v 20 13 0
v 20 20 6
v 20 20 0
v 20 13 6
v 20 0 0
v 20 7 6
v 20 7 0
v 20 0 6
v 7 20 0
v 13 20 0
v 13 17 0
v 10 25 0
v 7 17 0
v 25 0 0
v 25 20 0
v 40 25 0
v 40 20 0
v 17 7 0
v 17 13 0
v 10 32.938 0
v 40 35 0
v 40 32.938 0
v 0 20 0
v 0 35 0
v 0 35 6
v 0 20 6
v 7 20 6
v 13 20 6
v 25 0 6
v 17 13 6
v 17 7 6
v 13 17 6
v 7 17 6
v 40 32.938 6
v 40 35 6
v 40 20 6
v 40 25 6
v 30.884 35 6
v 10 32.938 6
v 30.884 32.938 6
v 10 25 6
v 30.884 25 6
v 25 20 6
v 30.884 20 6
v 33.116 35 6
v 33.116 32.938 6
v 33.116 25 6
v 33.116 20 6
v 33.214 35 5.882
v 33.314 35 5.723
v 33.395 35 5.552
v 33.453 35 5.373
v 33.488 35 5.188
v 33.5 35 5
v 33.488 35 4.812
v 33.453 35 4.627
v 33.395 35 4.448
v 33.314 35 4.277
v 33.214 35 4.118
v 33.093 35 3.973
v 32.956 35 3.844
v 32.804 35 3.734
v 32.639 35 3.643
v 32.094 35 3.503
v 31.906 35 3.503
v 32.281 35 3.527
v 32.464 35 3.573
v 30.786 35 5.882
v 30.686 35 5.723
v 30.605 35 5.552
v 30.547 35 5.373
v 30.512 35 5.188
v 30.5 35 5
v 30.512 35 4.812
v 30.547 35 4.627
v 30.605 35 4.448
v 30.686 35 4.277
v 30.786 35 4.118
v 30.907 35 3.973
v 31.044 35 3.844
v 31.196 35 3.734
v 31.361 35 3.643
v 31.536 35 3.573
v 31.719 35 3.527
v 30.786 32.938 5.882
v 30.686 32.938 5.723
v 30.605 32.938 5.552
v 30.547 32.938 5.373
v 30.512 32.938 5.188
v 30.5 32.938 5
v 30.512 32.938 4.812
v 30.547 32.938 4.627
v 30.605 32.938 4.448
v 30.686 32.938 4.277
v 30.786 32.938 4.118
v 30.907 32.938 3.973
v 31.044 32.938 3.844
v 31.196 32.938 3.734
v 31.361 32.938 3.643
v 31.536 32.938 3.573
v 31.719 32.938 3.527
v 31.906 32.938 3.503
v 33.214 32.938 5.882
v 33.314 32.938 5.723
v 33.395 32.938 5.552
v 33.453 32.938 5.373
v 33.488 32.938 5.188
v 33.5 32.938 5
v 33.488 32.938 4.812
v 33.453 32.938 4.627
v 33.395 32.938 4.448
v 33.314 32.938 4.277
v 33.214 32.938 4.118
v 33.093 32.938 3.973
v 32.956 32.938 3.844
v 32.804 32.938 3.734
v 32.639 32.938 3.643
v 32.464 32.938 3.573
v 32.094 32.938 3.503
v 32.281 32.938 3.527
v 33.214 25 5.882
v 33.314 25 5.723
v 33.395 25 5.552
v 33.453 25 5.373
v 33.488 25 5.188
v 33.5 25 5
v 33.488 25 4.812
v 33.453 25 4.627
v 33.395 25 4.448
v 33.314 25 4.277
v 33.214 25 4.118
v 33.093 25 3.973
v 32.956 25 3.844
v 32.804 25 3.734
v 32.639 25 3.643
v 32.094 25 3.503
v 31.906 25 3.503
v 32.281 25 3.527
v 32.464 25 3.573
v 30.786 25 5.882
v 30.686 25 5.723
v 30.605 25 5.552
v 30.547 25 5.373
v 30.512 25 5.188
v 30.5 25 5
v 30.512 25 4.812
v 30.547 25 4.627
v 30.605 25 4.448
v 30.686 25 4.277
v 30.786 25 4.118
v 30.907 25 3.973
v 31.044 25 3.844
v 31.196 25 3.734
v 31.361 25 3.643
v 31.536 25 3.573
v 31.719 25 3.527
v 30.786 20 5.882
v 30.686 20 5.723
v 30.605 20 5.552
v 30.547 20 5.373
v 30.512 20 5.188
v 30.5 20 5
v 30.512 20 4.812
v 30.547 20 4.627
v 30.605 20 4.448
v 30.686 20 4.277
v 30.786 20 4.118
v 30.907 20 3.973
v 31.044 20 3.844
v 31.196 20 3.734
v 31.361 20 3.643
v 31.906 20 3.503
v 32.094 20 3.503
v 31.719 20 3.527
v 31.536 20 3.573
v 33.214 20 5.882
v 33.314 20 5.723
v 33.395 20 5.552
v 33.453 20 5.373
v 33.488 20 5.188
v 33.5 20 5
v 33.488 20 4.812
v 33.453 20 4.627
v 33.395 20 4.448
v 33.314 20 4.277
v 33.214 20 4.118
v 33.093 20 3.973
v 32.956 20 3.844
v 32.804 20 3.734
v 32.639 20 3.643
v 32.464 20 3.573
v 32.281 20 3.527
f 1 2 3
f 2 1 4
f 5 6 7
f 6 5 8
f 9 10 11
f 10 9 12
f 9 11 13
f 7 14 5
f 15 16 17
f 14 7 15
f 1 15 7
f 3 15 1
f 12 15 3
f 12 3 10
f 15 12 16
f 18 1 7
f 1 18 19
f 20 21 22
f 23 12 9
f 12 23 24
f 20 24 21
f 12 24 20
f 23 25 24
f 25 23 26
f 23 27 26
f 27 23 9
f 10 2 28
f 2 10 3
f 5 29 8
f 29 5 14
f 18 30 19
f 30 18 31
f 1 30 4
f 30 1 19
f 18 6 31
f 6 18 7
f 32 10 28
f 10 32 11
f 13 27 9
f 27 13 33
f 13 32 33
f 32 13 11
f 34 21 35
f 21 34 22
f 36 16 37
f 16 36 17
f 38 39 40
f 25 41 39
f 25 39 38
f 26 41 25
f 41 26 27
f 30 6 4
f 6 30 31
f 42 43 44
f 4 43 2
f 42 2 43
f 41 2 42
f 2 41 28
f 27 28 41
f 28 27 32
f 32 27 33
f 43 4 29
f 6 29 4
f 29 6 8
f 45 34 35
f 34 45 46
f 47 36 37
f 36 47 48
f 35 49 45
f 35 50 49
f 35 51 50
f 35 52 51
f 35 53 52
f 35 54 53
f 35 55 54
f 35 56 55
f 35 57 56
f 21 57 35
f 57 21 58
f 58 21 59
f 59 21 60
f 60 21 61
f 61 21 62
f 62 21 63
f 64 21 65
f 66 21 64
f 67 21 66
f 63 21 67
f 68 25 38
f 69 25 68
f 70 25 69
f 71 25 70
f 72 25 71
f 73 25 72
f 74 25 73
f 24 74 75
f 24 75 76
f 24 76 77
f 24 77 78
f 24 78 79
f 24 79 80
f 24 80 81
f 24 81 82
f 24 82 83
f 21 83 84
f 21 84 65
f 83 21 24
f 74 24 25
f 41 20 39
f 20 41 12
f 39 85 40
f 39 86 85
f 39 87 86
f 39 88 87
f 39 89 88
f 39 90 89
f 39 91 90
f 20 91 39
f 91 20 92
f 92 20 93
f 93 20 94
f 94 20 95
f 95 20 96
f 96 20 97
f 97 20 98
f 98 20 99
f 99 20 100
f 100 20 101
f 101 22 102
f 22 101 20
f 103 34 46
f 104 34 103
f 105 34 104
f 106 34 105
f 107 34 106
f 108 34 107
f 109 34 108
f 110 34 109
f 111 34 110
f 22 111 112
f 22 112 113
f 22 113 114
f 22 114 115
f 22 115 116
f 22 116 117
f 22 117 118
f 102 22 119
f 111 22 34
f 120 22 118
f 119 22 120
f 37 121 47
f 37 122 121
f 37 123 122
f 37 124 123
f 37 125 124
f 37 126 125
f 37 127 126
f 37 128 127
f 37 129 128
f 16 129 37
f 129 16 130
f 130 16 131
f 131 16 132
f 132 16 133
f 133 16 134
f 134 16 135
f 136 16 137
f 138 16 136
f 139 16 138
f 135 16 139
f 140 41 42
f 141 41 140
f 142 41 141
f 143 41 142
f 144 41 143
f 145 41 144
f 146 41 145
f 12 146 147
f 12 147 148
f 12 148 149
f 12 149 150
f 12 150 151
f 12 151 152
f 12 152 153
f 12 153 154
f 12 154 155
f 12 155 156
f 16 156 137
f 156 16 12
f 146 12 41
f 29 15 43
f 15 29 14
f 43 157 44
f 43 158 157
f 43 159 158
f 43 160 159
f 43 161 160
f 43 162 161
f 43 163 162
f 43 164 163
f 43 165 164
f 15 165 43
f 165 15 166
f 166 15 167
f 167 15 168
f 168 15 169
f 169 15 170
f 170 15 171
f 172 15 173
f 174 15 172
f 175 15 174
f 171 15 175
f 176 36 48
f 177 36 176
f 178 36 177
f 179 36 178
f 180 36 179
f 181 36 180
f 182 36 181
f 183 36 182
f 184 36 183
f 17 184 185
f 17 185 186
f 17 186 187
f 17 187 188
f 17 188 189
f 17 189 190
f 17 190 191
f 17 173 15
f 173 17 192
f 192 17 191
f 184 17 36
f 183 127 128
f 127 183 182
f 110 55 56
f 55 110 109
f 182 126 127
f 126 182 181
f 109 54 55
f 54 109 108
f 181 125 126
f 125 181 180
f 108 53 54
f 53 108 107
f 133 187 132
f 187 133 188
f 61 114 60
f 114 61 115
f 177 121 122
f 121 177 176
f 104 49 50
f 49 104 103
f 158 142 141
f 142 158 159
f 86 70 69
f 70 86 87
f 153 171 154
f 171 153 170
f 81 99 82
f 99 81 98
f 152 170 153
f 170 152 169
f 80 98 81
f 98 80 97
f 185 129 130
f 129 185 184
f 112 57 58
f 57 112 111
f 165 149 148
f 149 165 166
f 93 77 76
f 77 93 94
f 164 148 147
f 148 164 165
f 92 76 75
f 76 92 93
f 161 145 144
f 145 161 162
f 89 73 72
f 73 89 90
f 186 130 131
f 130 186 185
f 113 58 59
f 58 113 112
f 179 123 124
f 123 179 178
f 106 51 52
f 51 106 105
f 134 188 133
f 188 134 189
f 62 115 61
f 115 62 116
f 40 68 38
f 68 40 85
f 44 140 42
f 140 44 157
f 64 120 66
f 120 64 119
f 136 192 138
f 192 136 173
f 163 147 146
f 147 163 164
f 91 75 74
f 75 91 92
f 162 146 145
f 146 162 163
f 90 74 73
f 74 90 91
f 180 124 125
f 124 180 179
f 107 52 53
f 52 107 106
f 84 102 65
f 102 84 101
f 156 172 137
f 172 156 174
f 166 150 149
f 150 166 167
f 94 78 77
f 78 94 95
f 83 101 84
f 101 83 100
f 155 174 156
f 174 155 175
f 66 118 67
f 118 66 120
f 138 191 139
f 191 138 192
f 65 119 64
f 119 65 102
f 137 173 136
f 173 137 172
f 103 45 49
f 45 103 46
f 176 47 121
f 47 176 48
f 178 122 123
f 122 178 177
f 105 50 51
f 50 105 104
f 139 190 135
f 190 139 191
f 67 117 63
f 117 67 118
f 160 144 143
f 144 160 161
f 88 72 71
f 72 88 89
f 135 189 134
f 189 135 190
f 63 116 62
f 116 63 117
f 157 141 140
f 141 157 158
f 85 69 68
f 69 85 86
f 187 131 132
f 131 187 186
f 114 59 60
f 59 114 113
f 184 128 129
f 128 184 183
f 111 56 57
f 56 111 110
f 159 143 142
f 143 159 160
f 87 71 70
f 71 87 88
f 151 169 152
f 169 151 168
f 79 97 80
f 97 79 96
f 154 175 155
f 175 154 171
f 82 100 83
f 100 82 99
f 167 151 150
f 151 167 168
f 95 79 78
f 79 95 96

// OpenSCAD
// file: inc/functions.scad
// PRUSA iteration3
// Functions used in many files
// GNU GPL v3
// Josef Průša <josefprusa@me.com>
// Václav 'ax' Hůla <axtheb@gmail.com>
// Vlnofka <>
// http://www.reprap.org/wiki/Prusa_Mendel
// http://github.com/josefprusa/Prusa3


module nut(d,h,horizontal=true){
    cornerdiameter =  (d / 2) / cos (180 / 6);
    cylinder(h = h, r = cornerdiameter, $fn = 6);
    if(horizontal){
        for(i = [1:6]){
            rotate([0,0,60*i]) translate([-cornerdiameter-0.2,0,0]) rotate([0,0,-45]) cube([2,2,h]);
        }
    }
}

module fillet(radius, height=100, $fn=0) {
    //this creates acutal fillet
    translate([-radius, -radius, -height / 2 - 0.02]) difference() {
        cube([radius * 2, radius * 2, height + 0.04]);
        if ($fn == 0 && (radius == 2 || radius == 3 || radius == 4)) {
            cylinder(r=radius, h=height + 0.04, $fn=4 * radius);
        } else {
            cylinder(r=radius, h=height + 0.04, $fn=$fn);
        }

    }
}

module cube_fillet(size, radius=-1, vertical=[3,3,3,3], top=[0,0,0,0], bottom=[0,0,0,0], center=false, $fn=0){
    //
    if (use_fillets == 1) {
        if (center) {
            cube_fillet_inside(size, radius, vertical, top, bottom, $fn);
        } else {
            translate([size[0]/2, size[1]/2, size[2]/2])
                cube_fillet_inside(size, radius, vertical, top, bottom, $fn);
        }
    } else {
        if (use_fillets == 2) {
            if (center) {
                cube_fillet_inside(size, radius, vertical, top, bottom, 4);
            } else {
                translate([size[0]/2, size[1]/2, size[2]/2])
                    cube_fillet_inside(size, radius, vertical, top, bottom, 4);
            }

        } else {
            cube(size, center);
        }
    }

}

module cube_negative_fillet(size, radius=-1, vertical=[3,3,3,3], top=[0,0,0,0], bottom=[0,0,0,0], $fn=0){

    j=[1,0,1,0];

    for (i=[0:3]) {
        if (radius > -1) {
            rotate([0, 0, 90*i]) translate([size[1-j[i]]/2, size[j[i]]/2, 0]) fillet(radius, size[2], $fn=$fn);
        } else {
            rotate([0, 0, 90*i]) translate([size[1-j[i]]/2, size[j[i]]/2, 0]) fillet(vertical[i], size[2], $fn=$fn);
        }
        rotate([90*i, -90, 0]) translate([size[2]/2, size[j[i]]/2, 0 ]) fillet(top[i], size[1-j[i]], $fn=$fn);
        rotate([90*(4-i), 90, 0]) translate([size[2]/2, size[j[i]]/2, 0]) fillet(bottom[i], size[1-j[i]], $fn=$fn);

    }
}

module cube_fillet_inside(size, radius=-1, vertical=[3,3,3,3], top=[0,0,0,0], bottom=[0,0,0,0], $fn=0){
    //makes CENTERED cube with round corners
    // if you give it radius, it will fillet vertical corners.
    //othervise use vertical, top, bottom arrays
    //when viewed from top, it starts in upper right corner (+x,+y quadrant) , goes counterclockwise
    //top/bottom fillet starts in direction of Y axis and goes CCW too


    if (radius == 0) {
        cube(size, center=true);
    } else {
        difference() {
            cube(size, center=true);
            cube_negative_fillet(size, radius, vertical, top, bottom, $fn);
        }
    }
}


module nema17(places=[1,1,1,1], size=15.5, h=10, holes=false, shadow=false, $fn=24){
    for (i=[0:3]) {
        if (places[i] == 1) {
            rotate([0, 0, 90*i]) translate([size, size, 0]) {
                if (holes) {
                    rotate([0, 0, -90*i])  translate([0,0,-10]) screw(r=1.7, slant=false, head_drop=13, $fn=$fn, h=h+12);
                } else {
                    rotate([0, 0, -90*i]) cylinder(h=h, r=5.5, $fn=$fn);
                }
            }
        }
    }
    if (shadow != false) {
        %translate ([0, 0, shadow+21+3]) cube([42,42,42], center = true);
    //flange
        %translate ([0, 0, shadow+21+3-21-1]) cylinder(r=11,h=2, center = true, $fn=20);
    //shaft
        %translate ([0, 0, shadow+21+3-21-7]) cylinder(r=2.5,h=14, center = true);
    }
}

module screw(h=20, r=2, r_head=3.5, head_drop=0, slant=i_am_box, poly=false, $fn=0){
    //makes screw with head
    //for substraction as screw hole
    if (poly) {
        cylinder_poly(h=h, r=r, $fn=$fn);
    } else {
        cylinder(h=h, r=r, $fn=$fn);
    }
    if (slant) {
        translate([0, 0, head_drop-0.01]) cylinder(h=r_head, r2=0, r1=r_head, $fn=$fn);
    }

    if (head_drop > 0) {
        translate([0, 0, -0.01]) cylinder(h=head_drop+0.01, r=r_head, $fn=$fn);
    }
}

module plate_screw(long=0) {
    if (i_am_box == 0) {
        translate([0, 0, -long]) screw(head_drop=14 + long, h=30 + long, r_head=3.6, r=1.7, $fn=24, slant=false);
    } else {
        translate([0, 0, -2 - long]) screw(head_drop=14 + long, h=30 + long, r_head=4.5, r=2, $fn=24, slant=true);
    }
}

//radius of the idler assembly (to surface that touches belt, ignoring guide walls)
function idler_assy_r_inner(idler_bearing) = (idler_bearing[0] / 2) + (6 * single_wall_width + 0.2) * idler_bearing[3];
//outer radius of the idler assembly (to smooth side of belt) 
function idler_assy_r_outer(idler_bearing) = idler_assy_r_inner(idler_bearing) + belt_thickness + 1;

module ext2020(l=20) {
  translate([0,0,l/2])
  difference(){
    cube([20,20,l], center=true);
    translate([10-1.5,0,0])cube([3,6,l], center=true);
    translate([-10+1.5,0,0])cube([3,6,l], center=true);
    translate([0,10-1.5,0])cube([6,3,l], center=true);
    translate([0,-10+1.5,0])cube([6,3,l], center=true);
  }
}

module idler_assy(idler_bearing = [22, 7, 8, 1]) {

    //bearing axle
    translate([0,0,-1]) cylinder(h = 120, r=(idler_bearing[2] + 1) / 2, $fn=small_hole_segments, center=true);
    //bearing shadow
    %cylinder(h = idler_bearing[1], r=idler_bearing[0]/2, center=true);
    //belt shadow
    %cylinder(h = belt_width, r=idler_assy_r_outer(idler_bearing), center=true);

    cylinder(h = idler_width + 1, r=idler_assy_r_outer(idler_bearing) + 0.5, center=true);
}

module belt(len, side = 0){
    //belt. To be substracted from model
    //len is in +Z, smooth side in +X, Y centered
    translate([-0.5, 0, 0]) maketeeth(len);
    translate([0, -4.5, -0.01]) cube([belt_thickness, 9, len + 0.02]);
    if (side != 0) {
    translate([0, -4.5 + side, -0.01]) cube_fillet([belt_thickness, 9, len + 0.02], vertical = [3, 0, 0, 0]);
    }
}


module maketeeth(len){
    //Belt teeth. 
    for (i = [0 : len / belt_tooth_distance]) {
        translate([0, 0, i * belt_tooth_distance]) cube([2, 9, belt_tooth_distance * belt_tooth_ratio], center = true);
    }
}
// main file
use<inc/functions.scad>

thick=(5/16) * 25.4; // Thickness of stock to be held, default is 5/16 (foamcore poster board).

difference() {
  cube([40,35,6]); // basic shape
  translate([10,10,0])ext2020(10); // 2020 extrusion cutout
  cube([15,15,10]); // further cutout for the 2020, remove tabs.
  translate([10,25,0])color("blue")cube([90, thick,10]);
  translate([25,0,0])color("red") cube([50,20,10]); // top thickness, reduce the translate to make it thinner. 
  translate([32,0,5])rotate([-90,0,0])cylinder(r=1.5, h=60,$fn=50); // hole to bolt stock on.
}
